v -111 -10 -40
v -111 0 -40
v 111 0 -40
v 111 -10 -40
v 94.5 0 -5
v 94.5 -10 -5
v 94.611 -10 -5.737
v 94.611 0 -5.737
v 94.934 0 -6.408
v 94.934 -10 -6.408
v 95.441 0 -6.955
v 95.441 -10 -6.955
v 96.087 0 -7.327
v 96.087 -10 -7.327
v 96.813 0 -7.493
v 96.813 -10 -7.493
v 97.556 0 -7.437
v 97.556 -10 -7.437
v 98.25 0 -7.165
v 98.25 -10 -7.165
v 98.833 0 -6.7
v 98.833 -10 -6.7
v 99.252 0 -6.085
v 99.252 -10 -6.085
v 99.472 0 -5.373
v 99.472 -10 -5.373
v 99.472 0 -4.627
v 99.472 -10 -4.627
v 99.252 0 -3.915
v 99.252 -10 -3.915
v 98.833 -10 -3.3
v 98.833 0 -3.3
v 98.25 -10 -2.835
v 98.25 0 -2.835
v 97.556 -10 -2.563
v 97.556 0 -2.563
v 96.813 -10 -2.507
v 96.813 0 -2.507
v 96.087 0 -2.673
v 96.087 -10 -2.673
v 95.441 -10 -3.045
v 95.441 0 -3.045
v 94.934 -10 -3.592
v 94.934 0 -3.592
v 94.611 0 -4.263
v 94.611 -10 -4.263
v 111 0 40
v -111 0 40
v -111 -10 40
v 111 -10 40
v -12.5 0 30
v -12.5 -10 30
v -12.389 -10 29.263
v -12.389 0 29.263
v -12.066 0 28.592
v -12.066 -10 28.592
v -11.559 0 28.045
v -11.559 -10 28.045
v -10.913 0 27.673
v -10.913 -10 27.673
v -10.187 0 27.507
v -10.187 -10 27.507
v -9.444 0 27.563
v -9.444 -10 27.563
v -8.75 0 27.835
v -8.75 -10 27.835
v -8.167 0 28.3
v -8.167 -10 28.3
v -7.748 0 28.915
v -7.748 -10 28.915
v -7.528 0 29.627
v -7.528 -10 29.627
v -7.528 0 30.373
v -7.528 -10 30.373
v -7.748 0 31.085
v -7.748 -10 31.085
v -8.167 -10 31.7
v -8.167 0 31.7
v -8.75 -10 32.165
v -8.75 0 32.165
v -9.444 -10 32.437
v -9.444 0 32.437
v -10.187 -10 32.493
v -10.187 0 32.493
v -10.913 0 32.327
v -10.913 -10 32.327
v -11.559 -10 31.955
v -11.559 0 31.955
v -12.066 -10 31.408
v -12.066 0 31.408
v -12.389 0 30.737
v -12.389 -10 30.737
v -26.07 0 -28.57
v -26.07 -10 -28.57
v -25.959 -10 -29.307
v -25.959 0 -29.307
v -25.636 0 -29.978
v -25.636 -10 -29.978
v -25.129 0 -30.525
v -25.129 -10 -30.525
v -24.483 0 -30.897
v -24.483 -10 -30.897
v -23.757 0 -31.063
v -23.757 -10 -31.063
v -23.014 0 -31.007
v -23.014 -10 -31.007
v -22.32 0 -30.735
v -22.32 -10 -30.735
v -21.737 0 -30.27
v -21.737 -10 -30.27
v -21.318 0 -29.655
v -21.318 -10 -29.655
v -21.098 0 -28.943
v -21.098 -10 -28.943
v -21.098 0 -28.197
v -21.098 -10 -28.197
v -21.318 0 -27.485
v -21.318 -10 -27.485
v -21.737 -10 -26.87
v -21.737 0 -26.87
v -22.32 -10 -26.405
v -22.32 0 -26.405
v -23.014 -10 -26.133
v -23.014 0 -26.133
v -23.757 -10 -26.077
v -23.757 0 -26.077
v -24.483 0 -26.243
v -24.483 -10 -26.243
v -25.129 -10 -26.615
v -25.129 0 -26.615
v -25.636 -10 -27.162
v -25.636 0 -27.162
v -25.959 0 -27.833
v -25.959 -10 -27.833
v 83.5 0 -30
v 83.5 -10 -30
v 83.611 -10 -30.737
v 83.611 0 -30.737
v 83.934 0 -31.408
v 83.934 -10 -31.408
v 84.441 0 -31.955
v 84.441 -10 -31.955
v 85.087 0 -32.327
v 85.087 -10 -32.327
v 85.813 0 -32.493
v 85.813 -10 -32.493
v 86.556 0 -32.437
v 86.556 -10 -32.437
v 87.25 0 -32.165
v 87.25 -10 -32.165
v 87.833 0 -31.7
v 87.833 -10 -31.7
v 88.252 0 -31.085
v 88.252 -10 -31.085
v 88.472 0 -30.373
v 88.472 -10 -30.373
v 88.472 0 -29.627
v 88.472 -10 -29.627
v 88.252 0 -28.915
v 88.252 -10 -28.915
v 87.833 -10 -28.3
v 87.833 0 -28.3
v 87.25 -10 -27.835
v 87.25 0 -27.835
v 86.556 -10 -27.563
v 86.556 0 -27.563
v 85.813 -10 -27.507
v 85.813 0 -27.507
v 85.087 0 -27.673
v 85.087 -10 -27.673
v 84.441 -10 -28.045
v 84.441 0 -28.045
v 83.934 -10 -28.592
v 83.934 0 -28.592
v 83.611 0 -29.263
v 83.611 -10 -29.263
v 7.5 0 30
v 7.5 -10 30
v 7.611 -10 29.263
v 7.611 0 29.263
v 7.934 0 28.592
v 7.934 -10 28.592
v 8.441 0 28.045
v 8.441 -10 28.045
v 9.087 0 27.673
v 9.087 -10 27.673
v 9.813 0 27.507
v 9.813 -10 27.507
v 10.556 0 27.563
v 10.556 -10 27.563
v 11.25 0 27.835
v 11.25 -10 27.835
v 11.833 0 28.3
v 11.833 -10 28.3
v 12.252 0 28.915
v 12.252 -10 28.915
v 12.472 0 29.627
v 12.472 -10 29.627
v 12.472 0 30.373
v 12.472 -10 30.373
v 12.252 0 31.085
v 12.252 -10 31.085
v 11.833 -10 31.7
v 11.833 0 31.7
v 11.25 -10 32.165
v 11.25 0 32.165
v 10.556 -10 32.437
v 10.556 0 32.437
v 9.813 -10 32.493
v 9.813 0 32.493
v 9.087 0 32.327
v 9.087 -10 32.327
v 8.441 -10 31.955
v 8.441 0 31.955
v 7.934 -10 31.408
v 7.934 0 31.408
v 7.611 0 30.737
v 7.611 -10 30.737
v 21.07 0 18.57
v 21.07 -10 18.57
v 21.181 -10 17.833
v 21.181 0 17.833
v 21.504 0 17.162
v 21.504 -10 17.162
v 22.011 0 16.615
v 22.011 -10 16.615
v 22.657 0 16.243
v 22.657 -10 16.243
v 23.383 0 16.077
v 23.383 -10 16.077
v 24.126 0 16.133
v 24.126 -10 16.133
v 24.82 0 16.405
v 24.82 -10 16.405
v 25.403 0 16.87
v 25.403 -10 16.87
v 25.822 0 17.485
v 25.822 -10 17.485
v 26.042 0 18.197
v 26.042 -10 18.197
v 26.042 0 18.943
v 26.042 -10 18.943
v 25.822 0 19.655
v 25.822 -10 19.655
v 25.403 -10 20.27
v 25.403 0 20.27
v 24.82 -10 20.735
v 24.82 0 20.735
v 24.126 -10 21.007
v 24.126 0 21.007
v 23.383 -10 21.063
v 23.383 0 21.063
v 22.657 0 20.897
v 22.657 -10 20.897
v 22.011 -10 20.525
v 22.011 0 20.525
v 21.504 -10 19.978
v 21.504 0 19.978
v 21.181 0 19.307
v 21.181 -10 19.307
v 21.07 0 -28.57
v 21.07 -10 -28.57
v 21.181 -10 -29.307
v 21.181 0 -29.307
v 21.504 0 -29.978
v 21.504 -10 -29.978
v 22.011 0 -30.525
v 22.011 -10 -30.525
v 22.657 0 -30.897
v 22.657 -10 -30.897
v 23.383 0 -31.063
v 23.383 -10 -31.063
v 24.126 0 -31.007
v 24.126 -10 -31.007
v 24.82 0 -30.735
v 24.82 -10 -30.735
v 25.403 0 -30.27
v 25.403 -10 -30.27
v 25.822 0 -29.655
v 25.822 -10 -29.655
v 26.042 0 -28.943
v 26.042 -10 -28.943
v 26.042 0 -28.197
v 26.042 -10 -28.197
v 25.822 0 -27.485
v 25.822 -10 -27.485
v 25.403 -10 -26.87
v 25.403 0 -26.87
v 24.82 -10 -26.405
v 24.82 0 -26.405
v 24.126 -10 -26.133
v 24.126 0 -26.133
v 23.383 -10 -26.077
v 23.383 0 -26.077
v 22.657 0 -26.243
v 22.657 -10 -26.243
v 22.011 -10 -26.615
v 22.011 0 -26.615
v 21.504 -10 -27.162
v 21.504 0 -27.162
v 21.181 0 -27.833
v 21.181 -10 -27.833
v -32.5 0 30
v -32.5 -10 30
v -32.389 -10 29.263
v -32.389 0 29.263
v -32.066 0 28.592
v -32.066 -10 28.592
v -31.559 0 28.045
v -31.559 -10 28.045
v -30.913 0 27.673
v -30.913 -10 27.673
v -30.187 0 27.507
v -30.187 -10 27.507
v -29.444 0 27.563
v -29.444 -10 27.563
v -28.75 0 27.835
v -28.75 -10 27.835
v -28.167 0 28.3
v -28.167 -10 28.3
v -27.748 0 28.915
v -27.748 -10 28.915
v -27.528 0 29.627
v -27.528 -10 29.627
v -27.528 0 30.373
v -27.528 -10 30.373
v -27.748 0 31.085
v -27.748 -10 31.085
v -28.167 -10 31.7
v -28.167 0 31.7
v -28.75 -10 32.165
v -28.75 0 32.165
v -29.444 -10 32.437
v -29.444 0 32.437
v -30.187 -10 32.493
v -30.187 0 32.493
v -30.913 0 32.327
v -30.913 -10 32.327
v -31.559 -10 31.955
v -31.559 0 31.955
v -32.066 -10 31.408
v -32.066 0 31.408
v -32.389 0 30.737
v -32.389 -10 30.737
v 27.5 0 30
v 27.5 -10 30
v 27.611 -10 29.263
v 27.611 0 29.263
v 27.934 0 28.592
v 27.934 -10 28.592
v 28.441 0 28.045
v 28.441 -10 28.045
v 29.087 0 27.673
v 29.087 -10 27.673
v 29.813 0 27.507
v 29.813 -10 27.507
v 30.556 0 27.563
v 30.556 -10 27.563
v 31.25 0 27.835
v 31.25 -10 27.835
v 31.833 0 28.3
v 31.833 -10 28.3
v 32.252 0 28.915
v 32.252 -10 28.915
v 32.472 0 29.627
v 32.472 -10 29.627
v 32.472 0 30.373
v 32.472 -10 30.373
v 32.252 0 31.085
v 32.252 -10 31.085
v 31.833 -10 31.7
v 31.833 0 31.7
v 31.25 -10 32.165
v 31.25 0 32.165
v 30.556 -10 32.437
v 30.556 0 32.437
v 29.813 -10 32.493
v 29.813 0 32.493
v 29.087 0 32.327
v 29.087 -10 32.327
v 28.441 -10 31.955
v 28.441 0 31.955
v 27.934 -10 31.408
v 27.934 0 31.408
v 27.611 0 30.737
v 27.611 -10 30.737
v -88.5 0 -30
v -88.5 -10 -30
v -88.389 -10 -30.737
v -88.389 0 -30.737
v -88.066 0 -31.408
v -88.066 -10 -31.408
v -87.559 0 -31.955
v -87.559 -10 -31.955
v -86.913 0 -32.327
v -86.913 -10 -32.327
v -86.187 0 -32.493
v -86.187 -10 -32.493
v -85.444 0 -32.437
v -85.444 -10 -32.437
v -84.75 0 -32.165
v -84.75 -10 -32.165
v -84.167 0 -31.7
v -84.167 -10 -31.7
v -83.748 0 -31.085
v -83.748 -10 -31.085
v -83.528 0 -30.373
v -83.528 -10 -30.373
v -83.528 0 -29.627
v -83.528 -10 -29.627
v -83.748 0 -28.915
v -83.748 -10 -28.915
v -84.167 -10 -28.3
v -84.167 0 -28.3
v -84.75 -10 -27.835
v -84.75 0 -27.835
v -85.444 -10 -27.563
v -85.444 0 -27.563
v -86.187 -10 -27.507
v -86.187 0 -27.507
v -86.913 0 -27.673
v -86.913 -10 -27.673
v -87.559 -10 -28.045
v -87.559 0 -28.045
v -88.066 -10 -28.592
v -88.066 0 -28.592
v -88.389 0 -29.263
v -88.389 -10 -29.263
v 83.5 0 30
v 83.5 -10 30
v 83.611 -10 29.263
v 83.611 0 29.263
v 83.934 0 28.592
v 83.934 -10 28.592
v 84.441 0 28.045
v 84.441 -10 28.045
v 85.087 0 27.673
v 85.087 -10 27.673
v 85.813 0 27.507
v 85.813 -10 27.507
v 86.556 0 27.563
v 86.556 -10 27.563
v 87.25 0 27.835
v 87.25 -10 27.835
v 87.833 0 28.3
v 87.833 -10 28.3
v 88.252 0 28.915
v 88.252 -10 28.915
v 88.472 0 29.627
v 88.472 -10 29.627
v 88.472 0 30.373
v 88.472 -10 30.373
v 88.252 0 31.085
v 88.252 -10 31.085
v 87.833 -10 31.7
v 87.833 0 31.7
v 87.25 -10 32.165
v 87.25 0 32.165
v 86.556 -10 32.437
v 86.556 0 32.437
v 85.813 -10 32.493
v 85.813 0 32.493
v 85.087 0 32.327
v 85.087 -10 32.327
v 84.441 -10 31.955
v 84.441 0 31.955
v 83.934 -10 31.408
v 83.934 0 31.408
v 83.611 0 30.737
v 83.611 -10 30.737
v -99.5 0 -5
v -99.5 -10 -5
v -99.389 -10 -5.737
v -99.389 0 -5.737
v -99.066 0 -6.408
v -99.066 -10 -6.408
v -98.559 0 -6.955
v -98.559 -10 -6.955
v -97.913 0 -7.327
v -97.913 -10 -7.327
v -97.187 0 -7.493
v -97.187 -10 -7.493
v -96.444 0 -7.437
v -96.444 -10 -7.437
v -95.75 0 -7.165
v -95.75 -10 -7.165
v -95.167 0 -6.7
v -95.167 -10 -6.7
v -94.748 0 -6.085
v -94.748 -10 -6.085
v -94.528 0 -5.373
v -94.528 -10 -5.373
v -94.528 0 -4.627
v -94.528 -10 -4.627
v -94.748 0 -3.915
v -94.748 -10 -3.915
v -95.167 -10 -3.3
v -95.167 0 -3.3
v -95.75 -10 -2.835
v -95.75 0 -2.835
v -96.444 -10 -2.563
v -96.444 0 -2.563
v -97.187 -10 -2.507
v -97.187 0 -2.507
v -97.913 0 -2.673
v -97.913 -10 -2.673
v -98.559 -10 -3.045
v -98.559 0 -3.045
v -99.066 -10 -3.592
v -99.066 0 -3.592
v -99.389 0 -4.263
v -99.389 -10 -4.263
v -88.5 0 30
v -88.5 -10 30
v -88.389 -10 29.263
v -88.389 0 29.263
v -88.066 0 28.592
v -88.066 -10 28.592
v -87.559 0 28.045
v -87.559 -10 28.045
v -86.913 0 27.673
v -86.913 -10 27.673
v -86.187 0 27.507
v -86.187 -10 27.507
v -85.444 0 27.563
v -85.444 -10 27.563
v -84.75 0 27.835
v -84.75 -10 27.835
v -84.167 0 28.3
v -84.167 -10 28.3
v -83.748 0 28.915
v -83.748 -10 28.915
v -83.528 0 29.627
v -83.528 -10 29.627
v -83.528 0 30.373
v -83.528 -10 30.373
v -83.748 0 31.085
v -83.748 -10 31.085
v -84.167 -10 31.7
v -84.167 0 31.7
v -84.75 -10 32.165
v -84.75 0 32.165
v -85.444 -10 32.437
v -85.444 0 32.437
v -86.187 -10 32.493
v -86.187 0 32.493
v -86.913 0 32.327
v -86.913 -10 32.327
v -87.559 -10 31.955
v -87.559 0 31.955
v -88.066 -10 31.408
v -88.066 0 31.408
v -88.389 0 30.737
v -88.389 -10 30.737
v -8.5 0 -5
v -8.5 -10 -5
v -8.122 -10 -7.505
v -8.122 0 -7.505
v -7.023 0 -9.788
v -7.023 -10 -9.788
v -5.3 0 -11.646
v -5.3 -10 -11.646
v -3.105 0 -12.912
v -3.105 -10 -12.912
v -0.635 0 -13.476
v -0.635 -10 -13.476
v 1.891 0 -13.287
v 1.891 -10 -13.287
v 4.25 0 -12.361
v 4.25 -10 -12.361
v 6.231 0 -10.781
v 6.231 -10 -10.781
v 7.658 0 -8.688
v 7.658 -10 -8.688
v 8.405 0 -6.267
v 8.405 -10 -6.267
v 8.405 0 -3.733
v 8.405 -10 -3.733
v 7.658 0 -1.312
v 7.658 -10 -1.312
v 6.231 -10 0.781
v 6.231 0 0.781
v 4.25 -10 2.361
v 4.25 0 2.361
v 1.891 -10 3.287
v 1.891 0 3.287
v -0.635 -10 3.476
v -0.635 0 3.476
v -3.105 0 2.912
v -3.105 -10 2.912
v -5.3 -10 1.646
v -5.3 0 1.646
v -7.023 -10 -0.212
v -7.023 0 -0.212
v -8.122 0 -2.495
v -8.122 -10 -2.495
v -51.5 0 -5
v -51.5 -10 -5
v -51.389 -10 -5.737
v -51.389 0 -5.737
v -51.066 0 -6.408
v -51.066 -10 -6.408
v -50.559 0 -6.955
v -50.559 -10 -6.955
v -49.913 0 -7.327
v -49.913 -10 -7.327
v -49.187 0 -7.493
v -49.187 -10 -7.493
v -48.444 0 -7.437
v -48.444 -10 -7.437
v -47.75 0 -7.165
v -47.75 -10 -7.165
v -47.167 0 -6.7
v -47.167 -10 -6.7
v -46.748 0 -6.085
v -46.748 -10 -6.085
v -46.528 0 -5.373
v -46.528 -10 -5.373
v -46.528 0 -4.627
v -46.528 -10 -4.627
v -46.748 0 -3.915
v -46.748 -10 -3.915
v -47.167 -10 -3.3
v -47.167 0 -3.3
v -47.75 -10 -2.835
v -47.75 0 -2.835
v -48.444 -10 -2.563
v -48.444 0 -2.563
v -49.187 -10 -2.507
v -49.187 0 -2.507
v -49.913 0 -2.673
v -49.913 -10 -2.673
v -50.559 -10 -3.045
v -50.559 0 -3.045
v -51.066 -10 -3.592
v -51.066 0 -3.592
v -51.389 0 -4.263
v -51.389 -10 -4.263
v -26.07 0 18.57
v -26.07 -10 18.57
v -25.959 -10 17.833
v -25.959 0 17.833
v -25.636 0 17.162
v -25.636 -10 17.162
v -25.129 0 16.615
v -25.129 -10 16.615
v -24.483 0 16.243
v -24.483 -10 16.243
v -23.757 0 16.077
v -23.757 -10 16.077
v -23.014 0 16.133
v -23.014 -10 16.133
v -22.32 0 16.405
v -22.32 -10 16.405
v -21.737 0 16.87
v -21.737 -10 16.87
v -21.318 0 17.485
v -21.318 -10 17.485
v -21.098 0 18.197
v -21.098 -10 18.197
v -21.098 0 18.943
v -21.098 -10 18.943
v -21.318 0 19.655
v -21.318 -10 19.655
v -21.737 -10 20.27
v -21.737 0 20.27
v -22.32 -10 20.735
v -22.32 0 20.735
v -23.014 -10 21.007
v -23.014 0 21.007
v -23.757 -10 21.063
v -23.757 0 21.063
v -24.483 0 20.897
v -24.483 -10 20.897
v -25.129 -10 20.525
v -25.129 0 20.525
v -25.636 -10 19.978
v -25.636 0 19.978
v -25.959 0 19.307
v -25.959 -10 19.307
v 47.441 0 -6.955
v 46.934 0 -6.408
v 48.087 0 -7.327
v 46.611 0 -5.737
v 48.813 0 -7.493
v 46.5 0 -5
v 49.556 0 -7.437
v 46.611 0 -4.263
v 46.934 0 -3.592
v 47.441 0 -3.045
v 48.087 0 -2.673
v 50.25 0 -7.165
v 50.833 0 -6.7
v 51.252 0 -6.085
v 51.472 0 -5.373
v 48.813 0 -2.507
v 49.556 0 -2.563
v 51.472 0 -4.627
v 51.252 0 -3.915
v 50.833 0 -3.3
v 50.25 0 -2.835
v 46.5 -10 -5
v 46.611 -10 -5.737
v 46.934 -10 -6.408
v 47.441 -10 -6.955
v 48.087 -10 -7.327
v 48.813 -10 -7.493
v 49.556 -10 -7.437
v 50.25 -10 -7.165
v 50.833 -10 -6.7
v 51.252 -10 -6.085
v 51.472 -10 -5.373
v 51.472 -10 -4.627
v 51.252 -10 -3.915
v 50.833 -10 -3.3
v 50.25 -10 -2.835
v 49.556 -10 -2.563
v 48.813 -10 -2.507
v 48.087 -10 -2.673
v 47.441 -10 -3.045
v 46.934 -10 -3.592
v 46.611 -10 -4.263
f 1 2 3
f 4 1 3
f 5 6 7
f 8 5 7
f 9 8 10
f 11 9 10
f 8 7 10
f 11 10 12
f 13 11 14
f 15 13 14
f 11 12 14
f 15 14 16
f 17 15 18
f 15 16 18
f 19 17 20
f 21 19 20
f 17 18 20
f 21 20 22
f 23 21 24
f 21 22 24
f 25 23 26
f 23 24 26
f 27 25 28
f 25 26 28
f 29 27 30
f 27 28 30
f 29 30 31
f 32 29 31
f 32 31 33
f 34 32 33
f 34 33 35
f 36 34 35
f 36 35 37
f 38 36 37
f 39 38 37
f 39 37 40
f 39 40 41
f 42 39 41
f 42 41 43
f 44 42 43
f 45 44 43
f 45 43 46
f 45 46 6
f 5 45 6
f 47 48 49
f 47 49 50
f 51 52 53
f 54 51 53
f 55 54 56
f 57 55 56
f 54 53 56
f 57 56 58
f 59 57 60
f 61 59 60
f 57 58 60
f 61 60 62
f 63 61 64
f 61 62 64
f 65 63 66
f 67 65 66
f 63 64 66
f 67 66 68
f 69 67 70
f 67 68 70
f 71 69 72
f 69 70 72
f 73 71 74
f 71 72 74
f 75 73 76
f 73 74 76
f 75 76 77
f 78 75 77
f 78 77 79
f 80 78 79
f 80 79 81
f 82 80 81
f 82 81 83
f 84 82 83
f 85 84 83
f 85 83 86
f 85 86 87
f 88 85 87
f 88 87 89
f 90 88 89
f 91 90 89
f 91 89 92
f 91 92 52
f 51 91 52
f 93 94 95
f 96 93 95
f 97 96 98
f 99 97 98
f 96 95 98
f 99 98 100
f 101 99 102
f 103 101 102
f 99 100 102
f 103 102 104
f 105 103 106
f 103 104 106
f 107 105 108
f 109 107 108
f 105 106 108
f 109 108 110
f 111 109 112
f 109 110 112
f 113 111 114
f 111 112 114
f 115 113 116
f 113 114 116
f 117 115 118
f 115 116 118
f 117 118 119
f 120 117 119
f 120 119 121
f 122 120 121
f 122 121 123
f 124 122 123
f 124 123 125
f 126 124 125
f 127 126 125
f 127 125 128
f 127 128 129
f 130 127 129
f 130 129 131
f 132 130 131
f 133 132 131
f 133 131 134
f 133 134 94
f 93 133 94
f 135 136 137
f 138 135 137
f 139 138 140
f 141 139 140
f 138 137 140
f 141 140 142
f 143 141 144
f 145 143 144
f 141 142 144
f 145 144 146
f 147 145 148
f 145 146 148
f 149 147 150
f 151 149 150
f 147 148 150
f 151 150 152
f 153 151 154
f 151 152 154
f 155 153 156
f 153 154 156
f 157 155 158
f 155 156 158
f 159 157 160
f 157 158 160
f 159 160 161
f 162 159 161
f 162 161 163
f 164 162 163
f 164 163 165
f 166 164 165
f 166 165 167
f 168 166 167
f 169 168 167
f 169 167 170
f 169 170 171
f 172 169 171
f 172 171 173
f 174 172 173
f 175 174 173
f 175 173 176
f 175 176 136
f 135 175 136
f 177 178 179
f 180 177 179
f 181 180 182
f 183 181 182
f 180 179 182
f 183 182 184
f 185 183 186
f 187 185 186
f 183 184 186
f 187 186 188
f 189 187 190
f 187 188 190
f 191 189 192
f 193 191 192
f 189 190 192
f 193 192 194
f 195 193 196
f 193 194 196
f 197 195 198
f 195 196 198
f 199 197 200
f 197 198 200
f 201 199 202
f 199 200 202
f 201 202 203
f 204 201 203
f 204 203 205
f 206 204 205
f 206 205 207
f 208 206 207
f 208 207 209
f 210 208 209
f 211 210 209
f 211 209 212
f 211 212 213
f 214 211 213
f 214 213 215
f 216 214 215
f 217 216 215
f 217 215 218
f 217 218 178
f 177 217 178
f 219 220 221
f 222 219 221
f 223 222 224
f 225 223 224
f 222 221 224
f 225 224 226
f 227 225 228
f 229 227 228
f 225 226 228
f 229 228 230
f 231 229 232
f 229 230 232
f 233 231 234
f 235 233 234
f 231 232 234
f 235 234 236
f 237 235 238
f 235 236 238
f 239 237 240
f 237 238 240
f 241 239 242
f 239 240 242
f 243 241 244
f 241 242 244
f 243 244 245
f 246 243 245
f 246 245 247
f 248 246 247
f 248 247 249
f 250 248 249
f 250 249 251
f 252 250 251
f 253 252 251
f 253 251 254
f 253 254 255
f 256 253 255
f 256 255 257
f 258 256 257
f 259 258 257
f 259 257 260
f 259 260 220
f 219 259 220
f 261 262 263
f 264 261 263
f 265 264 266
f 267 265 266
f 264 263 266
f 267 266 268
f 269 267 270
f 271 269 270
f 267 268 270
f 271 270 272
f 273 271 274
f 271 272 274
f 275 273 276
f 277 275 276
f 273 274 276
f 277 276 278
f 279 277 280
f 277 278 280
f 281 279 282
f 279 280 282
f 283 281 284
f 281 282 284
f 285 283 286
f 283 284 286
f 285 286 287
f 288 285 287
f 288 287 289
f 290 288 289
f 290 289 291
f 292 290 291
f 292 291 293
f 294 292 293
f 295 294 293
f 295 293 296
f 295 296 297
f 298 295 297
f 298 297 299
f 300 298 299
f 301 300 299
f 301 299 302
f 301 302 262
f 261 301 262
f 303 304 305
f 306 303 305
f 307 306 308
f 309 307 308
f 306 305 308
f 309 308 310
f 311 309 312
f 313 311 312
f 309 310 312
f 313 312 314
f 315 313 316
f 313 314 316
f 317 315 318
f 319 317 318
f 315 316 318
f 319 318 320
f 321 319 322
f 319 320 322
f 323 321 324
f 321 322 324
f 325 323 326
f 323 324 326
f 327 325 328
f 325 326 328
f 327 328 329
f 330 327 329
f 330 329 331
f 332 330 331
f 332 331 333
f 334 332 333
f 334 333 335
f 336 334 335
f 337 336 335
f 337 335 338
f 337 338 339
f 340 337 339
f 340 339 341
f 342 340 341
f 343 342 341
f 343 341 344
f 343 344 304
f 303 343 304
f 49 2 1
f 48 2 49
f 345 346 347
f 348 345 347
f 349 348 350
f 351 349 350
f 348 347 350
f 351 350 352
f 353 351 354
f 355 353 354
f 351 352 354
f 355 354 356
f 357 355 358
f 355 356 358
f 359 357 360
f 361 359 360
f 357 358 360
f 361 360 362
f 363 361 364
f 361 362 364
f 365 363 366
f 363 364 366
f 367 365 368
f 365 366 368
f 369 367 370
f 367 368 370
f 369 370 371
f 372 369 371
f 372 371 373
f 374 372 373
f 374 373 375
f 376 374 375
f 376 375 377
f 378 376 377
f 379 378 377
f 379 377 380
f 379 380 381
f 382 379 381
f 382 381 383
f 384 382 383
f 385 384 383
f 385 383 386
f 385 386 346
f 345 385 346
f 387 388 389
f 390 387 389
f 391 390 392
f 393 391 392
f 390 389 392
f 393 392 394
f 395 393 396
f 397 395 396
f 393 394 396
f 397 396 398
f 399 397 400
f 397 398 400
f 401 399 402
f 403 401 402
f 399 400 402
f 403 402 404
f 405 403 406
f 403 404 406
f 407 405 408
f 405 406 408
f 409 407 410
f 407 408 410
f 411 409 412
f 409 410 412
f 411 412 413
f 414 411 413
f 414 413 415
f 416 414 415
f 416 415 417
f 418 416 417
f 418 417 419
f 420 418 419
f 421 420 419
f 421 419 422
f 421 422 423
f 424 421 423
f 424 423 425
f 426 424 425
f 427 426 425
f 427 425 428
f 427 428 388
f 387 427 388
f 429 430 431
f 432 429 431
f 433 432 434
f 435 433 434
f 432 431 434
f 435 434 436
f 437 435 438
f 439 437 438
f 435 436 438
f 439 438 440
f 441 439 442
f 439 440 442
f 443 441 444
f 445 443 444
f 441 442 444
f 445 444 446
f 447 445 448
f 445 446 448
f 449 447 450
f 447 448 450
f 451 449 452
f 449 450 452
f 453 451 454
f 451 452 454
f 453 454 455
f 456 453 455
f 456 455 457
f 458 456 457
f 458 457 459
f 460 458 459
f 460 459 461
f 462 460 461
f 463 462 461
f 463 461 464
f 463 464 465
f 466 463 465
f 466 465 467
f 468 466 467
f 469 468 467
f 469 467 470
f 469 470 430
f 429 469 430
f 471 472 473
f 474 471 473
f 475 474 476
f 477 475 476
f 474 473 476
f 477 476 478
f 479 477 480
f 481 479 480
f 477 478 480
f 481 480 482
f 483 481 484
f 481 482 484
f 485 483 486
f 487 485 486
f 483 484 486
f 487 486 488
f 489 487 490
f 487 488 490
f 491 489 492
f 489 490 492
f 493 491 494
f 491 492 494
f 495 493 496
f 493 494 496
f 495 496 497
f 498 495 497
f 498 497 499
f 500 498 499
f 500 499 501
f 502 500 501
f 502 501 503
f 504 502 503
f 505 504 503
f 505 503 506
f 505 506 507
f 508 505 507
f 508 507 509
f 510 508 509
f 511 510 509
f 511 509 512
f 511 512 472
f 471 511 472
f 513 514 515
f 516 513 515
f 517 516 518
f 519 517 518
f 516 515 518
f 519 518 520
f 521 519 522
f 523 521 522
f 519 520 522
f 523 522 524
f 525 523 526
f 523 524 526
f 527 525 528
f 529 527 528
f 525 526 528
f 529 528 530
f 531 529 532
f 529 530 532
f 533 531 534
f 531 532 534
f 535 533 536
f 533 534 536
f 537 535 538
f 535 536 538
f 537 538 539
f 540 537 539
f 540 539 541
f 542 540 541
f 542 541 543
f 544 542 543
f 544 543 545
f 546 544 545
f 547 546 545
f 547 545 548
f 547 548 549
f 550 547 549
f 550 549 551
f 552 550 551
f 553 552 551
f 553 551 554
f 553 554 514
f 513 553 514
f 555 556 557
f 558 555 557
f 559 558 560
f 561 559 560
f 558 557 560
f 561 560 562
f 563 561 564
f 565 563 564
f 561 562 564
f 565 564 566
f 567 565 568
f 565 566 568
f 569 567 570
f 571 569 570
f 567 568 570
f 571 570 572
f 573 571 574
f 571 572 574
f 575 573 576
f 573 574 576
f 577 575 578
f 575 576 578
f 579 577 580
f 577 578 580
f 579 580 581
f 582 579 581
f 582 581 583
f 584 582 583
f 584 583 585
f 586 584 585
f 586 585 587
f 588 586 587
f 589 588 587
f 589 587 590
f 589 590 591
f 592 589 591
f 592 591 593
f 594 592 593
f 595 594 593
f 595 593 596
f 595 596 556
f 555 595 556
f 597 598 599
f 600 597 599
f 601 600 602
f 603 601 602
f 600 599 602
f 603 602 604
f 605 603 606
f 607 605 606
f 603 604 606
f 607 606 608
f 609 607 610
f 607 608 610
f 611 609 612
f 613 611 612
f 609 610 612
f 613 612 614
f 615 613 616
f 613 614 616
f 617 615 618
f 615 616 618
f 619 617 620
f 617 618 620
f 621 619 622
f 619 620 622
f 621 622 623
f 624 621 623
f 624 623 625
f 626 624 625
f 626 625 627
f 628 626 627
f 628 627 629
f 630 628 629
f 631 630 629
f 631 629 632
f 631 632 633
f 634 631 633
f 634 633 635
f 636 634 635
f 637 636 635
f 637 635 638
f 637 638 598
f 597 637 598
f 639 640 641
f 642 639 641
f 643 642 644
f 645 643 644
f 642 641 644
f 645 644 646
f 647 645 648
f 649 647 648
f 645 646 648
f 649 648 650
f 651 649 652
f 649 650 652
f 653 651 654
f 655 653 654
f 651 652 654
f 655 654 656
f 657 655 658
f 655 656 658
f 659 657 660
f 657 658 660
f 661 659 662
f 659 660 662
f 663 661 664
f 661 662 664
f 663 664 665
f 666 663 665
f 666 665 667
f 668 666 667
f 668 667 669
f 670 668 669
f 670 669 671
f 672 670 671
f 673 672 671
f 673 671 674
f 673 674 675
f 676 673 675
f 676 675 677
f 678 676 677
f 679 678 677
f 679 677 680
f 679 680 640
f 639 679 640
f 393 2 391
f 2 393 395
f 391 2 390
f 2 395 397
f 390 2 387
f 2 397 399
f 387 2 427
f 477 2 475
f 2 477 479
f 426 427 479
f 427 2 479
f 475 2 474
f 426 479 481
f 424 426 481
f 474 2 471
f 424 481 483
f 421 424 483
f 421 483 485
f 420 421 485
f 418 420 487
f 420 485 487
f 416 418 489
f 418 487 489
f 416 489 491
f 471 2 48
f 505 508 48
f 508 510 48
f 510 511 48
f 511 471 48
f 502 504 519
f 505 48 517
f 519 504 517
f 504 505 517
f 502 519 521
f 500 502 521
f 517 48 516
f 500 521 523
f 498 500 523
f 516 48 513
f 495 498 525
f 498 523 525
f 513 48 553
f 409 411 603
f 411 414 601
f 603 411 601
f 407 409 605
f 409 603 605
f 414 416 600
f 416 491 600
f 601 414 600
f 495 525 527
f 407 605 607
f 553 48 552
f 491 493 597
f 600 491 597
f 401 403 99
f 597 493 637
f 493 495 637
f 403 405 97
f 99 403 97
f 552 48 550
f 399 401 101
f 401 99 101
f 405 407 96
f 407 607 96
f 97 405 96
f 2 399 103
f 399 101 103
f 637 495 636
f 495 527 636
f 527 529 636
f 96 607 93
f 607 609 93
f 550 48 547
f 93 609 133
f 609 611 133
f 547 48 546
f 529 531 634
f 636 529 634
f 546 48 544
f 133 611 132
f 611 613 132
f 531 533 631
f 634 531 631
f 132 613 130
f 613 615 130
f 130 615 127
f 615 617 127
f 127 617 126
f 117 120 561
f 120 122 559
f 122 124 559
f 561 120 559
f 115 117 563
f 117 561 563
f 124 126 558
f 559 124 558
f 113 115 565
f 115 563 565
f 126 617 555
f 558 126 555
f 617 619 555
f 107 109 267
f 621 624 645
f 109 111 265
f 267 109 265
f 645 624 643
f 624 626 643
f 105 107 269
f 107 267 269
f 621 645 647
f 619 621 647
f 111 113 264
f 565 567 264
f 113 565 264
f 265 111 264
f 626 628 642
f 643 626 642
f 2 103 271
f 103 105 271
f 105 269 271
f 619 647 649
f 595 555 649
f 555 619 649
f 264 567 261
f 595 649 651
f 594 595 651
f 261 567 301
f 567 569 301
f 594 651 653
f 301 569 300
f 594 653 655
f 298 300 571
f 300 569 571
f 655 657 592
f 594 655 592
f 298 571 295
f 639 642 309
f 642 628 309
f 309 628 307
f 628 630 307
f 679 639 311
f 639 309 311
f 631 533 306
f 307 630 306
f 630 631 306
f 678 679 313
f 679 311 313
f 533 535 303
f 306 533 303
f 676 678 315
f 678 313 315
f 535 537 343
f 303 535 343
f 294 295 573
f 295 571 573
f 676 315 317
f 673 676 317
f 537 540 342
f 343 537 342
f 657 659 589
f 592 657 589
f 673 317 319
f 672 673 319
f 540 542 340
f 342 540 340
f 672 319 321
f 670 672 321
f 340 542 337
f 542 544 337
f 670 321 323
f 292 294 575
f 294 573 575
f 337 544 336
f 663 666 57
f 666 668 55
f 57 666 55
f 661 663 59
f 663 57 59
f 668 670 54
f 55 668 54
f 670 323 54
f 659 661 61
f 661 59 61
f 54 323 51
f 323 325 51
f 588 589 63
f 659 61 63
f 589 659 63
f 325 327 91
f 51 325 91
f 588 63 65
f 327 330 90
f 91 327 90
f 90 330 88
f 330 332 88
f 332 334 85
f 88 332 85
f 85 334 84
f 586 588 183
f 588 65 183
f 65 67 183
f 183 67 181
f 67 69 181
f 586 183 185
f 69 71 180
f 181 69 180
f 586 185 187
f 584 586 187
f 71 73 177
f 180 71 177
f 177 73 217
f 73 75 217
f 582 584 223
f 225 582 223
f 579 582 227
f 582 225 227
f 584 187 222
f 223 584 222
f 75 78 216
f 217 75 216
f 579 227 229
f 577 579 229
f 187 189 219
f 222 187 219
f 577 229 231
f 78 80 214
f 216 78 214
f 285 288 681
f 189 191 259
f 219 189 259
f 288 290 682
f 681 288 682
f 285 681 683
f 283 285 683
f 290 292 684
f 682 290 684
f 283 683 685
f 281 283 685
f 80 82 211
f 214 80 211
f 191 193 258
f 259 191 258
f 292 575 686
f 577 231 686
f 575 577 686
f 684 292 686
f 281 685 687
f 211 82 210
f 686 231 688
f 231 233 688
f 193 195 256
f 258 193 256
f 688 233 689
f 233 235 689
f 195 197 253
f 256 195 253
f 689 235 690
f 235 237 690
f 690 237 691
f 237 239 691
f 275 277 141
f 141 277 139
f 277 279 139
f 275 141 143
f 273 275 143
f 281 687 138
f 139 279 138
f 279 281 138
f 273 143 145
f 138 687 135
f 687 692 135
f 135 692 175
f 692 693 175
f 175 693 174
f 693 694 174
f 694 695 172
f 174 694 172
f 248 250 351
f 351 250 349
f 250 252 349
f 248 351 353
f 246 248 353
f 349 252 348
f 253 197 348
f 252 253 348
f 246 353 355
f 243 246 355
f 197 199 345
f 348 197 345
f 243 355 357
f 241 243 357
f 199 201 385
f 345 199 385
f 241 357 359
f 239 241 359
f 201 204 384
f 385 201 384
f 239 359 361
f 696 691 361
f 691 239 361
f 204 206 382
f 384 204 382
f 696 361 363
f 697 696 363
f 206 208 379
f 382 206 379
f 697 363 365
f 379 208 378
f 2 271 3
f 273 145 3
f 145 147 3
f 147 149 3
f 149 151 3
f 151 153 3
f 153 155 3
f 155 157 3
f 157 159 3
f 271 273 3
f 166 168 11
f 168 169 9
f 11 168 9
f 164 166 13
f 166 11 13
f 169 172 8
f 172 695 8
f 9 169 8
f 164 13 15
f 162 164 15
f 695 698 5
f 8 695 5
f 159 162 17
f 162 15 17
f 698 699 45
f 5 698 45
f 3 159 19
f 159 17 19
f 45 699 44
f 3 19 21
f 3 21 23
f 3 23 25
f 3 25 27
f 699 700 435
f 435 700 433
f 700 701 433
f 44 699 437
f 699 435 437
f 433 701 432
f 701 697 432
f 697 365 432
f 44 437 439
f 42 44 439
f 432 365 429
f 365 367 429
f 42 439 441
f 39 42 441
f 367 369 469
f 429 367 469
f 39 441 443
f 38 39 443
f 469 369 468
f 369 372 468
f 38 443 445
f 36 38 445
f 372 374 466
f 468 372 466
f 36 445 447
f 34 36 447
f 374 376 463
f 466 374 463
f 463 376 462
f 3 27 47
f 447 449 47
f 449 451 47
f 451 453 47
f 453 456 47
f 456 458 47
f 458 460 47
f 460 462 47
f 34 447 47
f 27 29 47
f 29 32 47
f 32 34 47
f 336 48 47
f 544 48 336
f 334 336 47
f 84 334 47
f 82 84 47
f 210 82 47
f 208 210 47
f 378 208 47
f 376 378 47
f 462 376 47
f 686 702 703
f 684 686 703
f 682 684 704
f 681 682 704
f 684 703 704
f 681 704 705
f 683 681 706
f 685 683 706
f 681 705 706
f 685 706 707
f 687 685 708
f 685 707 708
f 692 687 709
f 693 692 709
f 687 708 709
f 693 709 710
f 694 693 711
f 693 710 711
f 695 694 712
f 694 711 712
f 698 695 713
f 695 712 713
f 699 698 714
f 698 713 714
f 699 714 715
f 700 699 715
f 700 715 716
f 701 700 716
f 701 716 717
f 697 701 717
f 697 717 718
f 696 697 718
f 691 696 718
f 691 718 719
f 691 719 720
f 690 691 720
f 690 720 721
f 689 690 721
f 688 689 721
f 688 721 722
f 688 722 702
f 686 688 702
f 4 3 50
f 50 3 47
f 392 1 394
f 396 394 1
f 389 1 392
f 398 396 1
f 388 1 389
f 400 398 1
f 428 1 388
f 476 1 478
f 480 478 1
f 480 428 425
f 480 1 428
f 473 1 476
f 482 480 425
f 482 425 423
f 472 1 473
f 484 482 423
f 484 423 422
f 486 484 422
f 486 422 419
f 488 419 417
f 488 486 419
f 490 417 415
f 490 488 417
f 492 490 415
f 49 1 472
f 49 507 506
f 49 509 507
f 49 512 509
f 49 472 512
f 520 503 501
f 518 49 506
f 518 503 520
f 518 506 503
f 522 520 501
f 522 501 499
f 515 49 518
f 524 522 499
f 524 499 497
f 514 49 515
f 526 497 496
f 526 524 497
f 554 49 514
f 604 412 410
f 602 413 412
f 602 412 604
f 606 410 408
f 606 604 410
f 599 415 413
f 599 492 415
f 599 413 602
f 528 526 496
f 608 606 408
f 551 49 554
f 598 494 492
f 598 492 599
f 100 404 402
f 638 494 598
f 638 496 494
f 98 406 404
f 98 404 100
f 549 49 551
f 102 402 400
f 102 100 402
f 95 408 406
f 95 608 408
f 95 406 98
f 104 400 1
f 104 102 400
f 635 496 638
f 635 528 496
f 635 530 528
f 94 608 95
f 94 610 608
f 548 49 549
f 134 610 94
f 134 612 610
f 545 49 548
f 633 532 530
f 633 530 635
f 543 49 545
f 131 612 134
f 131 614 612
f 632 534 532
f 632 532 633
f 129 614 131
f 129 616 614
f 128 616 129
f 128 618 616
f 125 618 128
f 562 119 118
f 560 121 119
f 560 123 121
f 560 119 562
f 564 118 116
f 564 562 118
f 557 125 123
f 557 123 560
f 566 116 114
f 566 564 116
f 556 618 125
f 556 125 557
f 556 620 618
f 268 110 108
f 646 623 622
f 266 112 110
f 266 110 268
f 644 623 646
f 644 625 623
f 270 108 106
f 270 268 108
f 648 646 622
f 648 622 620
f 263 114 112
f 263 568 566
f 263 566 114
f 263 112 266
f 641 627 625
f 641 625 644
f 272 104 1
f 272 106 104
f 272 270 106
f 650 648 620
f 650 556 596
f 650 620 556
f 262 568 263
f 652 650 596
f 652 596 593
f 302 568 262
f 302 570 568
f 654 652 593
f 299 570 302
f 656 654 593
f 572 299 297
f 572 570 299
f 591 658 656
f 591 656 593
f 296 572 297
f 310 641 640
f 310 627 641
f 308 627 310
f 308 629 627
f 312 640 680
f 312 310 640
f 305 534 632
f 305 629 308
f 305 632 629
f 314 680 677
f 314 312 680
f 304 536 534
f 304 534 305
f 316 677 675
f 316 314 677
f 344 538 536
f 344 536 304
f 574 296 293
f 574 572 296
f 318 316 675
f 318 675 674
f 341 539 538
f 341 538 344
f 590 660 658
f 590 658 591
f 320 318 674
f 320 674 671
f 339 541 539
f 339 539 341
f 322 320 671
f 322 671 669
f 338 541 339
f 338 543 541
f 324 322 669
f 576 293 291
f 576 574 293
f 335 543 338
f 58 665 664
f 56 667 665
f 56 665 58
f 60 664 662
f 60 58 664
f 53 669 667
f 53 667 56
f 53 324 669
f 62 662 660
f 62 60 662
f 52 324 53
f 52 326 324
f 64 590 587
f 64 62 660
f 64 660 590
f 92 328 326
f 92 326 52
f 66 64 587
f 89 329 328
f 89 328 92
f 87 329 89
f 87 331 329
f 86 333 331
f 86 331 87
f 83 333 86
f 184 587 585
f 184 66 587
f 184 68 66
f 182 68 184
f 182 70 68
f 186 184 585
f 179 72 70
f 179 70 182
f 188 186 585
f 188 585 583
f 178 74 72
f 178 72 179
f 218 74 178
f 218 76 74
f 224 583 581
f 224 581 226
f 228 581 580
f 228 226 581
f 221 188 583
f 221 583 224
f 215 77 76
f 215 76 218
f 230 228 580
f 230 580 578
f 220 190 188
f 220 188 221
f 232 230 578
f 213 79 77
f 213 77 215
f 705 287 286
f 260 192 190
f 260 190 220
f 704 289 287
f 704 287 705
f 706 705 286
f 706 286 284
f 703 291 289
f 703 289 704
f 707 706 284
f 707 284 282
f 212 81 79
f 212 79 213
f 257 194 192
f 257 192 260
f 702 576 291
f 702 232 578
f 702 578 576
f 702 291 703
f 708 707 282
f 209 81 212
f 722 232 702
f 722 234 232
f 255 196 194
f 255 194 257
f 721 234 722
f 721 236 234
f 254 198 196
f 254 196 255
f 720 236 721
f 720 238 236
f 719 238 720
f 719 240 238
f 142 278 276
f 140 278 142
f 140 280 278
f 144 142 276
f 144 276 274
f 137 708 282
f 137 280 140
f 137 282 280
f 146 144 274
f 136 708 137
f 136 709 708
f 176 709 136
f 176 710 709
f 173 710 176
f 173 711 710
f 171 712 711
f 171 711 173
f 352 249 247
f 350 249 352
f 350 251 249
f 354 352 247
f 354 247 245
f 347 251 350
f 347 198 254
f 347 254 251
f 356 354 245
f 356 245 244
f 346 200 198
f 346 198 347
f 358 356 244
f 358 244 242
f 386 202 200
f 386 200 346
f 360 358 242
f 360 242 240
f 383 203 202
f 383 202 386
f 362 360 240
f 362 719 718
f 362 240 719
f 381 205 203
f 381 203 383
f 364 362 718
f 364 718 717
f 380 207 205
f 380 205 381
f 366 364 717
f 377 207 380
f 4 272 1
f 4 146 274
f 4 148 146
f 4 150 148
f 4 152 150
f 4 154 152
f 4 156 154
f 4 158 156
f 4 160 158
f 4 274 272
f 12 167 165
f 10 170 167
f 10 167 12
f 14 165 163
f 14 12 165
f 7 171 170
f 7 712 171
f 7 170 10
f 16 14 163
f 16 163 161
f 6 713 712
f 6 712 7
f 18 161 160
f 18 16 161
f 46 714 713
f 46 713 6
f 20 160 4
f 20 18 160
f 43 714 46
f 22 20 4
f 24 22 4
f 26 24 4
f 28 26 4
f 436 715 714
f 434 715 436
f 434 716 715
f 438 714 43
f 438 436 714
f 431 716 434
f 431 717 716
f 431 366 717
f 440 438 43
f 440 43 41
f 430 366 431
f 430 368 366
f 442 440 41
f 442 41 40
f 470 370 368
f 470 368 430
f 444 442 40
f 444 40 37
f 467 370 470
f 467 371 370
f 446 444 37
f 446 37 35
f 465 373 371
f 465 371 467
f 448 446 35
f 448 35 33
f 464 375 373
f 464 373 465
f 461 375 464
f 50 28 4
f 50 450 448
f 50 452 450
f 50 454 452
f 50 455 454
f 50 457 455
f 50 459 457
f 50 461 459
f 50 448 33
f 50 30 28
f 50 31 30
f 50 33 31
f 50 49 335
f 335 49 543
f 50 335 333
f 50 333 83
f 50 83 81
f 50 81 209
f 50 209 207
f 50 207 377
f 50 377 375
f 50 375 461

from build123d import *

# Parameters (mm, degrees)
F0_W     = 222
F0_H     = 80
F1_DEPTH = 10
F2_D     = 5
F3_D     = 17
F4_D     = 5
F5_D     = 5
F6_D     = 5


with BuildPart() as f1:
    # F0 (on Front) → F1 (new body)
    with BuildSketch(Plane.XZ):
        Rectangle(F0_W, F0_H)
    extrude(amount=F1_DEPTH)

    # F2 (through all)
    with Locations(Plane(origin=(0, 0, 0), x_dir=(1, 0, 0), z_dir=(0, 1, 0))):
        with Locations((97, 5), (49, 5), (-49, 5), (-97, 5)):
            Hole(F2_D / 2)

    # F3 (through all)
    with Locations(Plane(origin=(0, 0, 0), x_dir=(1, 0, 0), z_dir=(0, 1, 0))):
        with Locations((0, 5)):
            Hole(F3_D / 2)

    # F4 (through all)
    with Locations(Plane(origin=(0, 0, 0), x_dir=(1, 0, 0), z_dir=(0, 1, 0))):
        with Locations((-86, -30), (-86, 30), (86, 30), (86, -30)):
            Hole(F4_D / 2)

    # F5 (through all)
    with Locations(Plane(origin=(0, 0, 0), x_dir=(1, 0, 0), z_dir=(0, 1, 0))):
        with Locations((-30, -30), (-10, -30), (10, -30), (30, -30)):
            Hole(F5_D / 2)

    # F6 (through all)
    with Locations(Plane(origin=(0, 0, 0), x_dir=(1, 0, 0), z_dir=(0, 1, 0))):
        with Locations((-23.57, -18.57), (23.57, -18.57), (23.57, 28.57), (-23.57, 28.57)):
            Hole(F6_D / 2)


solid = f1.part
